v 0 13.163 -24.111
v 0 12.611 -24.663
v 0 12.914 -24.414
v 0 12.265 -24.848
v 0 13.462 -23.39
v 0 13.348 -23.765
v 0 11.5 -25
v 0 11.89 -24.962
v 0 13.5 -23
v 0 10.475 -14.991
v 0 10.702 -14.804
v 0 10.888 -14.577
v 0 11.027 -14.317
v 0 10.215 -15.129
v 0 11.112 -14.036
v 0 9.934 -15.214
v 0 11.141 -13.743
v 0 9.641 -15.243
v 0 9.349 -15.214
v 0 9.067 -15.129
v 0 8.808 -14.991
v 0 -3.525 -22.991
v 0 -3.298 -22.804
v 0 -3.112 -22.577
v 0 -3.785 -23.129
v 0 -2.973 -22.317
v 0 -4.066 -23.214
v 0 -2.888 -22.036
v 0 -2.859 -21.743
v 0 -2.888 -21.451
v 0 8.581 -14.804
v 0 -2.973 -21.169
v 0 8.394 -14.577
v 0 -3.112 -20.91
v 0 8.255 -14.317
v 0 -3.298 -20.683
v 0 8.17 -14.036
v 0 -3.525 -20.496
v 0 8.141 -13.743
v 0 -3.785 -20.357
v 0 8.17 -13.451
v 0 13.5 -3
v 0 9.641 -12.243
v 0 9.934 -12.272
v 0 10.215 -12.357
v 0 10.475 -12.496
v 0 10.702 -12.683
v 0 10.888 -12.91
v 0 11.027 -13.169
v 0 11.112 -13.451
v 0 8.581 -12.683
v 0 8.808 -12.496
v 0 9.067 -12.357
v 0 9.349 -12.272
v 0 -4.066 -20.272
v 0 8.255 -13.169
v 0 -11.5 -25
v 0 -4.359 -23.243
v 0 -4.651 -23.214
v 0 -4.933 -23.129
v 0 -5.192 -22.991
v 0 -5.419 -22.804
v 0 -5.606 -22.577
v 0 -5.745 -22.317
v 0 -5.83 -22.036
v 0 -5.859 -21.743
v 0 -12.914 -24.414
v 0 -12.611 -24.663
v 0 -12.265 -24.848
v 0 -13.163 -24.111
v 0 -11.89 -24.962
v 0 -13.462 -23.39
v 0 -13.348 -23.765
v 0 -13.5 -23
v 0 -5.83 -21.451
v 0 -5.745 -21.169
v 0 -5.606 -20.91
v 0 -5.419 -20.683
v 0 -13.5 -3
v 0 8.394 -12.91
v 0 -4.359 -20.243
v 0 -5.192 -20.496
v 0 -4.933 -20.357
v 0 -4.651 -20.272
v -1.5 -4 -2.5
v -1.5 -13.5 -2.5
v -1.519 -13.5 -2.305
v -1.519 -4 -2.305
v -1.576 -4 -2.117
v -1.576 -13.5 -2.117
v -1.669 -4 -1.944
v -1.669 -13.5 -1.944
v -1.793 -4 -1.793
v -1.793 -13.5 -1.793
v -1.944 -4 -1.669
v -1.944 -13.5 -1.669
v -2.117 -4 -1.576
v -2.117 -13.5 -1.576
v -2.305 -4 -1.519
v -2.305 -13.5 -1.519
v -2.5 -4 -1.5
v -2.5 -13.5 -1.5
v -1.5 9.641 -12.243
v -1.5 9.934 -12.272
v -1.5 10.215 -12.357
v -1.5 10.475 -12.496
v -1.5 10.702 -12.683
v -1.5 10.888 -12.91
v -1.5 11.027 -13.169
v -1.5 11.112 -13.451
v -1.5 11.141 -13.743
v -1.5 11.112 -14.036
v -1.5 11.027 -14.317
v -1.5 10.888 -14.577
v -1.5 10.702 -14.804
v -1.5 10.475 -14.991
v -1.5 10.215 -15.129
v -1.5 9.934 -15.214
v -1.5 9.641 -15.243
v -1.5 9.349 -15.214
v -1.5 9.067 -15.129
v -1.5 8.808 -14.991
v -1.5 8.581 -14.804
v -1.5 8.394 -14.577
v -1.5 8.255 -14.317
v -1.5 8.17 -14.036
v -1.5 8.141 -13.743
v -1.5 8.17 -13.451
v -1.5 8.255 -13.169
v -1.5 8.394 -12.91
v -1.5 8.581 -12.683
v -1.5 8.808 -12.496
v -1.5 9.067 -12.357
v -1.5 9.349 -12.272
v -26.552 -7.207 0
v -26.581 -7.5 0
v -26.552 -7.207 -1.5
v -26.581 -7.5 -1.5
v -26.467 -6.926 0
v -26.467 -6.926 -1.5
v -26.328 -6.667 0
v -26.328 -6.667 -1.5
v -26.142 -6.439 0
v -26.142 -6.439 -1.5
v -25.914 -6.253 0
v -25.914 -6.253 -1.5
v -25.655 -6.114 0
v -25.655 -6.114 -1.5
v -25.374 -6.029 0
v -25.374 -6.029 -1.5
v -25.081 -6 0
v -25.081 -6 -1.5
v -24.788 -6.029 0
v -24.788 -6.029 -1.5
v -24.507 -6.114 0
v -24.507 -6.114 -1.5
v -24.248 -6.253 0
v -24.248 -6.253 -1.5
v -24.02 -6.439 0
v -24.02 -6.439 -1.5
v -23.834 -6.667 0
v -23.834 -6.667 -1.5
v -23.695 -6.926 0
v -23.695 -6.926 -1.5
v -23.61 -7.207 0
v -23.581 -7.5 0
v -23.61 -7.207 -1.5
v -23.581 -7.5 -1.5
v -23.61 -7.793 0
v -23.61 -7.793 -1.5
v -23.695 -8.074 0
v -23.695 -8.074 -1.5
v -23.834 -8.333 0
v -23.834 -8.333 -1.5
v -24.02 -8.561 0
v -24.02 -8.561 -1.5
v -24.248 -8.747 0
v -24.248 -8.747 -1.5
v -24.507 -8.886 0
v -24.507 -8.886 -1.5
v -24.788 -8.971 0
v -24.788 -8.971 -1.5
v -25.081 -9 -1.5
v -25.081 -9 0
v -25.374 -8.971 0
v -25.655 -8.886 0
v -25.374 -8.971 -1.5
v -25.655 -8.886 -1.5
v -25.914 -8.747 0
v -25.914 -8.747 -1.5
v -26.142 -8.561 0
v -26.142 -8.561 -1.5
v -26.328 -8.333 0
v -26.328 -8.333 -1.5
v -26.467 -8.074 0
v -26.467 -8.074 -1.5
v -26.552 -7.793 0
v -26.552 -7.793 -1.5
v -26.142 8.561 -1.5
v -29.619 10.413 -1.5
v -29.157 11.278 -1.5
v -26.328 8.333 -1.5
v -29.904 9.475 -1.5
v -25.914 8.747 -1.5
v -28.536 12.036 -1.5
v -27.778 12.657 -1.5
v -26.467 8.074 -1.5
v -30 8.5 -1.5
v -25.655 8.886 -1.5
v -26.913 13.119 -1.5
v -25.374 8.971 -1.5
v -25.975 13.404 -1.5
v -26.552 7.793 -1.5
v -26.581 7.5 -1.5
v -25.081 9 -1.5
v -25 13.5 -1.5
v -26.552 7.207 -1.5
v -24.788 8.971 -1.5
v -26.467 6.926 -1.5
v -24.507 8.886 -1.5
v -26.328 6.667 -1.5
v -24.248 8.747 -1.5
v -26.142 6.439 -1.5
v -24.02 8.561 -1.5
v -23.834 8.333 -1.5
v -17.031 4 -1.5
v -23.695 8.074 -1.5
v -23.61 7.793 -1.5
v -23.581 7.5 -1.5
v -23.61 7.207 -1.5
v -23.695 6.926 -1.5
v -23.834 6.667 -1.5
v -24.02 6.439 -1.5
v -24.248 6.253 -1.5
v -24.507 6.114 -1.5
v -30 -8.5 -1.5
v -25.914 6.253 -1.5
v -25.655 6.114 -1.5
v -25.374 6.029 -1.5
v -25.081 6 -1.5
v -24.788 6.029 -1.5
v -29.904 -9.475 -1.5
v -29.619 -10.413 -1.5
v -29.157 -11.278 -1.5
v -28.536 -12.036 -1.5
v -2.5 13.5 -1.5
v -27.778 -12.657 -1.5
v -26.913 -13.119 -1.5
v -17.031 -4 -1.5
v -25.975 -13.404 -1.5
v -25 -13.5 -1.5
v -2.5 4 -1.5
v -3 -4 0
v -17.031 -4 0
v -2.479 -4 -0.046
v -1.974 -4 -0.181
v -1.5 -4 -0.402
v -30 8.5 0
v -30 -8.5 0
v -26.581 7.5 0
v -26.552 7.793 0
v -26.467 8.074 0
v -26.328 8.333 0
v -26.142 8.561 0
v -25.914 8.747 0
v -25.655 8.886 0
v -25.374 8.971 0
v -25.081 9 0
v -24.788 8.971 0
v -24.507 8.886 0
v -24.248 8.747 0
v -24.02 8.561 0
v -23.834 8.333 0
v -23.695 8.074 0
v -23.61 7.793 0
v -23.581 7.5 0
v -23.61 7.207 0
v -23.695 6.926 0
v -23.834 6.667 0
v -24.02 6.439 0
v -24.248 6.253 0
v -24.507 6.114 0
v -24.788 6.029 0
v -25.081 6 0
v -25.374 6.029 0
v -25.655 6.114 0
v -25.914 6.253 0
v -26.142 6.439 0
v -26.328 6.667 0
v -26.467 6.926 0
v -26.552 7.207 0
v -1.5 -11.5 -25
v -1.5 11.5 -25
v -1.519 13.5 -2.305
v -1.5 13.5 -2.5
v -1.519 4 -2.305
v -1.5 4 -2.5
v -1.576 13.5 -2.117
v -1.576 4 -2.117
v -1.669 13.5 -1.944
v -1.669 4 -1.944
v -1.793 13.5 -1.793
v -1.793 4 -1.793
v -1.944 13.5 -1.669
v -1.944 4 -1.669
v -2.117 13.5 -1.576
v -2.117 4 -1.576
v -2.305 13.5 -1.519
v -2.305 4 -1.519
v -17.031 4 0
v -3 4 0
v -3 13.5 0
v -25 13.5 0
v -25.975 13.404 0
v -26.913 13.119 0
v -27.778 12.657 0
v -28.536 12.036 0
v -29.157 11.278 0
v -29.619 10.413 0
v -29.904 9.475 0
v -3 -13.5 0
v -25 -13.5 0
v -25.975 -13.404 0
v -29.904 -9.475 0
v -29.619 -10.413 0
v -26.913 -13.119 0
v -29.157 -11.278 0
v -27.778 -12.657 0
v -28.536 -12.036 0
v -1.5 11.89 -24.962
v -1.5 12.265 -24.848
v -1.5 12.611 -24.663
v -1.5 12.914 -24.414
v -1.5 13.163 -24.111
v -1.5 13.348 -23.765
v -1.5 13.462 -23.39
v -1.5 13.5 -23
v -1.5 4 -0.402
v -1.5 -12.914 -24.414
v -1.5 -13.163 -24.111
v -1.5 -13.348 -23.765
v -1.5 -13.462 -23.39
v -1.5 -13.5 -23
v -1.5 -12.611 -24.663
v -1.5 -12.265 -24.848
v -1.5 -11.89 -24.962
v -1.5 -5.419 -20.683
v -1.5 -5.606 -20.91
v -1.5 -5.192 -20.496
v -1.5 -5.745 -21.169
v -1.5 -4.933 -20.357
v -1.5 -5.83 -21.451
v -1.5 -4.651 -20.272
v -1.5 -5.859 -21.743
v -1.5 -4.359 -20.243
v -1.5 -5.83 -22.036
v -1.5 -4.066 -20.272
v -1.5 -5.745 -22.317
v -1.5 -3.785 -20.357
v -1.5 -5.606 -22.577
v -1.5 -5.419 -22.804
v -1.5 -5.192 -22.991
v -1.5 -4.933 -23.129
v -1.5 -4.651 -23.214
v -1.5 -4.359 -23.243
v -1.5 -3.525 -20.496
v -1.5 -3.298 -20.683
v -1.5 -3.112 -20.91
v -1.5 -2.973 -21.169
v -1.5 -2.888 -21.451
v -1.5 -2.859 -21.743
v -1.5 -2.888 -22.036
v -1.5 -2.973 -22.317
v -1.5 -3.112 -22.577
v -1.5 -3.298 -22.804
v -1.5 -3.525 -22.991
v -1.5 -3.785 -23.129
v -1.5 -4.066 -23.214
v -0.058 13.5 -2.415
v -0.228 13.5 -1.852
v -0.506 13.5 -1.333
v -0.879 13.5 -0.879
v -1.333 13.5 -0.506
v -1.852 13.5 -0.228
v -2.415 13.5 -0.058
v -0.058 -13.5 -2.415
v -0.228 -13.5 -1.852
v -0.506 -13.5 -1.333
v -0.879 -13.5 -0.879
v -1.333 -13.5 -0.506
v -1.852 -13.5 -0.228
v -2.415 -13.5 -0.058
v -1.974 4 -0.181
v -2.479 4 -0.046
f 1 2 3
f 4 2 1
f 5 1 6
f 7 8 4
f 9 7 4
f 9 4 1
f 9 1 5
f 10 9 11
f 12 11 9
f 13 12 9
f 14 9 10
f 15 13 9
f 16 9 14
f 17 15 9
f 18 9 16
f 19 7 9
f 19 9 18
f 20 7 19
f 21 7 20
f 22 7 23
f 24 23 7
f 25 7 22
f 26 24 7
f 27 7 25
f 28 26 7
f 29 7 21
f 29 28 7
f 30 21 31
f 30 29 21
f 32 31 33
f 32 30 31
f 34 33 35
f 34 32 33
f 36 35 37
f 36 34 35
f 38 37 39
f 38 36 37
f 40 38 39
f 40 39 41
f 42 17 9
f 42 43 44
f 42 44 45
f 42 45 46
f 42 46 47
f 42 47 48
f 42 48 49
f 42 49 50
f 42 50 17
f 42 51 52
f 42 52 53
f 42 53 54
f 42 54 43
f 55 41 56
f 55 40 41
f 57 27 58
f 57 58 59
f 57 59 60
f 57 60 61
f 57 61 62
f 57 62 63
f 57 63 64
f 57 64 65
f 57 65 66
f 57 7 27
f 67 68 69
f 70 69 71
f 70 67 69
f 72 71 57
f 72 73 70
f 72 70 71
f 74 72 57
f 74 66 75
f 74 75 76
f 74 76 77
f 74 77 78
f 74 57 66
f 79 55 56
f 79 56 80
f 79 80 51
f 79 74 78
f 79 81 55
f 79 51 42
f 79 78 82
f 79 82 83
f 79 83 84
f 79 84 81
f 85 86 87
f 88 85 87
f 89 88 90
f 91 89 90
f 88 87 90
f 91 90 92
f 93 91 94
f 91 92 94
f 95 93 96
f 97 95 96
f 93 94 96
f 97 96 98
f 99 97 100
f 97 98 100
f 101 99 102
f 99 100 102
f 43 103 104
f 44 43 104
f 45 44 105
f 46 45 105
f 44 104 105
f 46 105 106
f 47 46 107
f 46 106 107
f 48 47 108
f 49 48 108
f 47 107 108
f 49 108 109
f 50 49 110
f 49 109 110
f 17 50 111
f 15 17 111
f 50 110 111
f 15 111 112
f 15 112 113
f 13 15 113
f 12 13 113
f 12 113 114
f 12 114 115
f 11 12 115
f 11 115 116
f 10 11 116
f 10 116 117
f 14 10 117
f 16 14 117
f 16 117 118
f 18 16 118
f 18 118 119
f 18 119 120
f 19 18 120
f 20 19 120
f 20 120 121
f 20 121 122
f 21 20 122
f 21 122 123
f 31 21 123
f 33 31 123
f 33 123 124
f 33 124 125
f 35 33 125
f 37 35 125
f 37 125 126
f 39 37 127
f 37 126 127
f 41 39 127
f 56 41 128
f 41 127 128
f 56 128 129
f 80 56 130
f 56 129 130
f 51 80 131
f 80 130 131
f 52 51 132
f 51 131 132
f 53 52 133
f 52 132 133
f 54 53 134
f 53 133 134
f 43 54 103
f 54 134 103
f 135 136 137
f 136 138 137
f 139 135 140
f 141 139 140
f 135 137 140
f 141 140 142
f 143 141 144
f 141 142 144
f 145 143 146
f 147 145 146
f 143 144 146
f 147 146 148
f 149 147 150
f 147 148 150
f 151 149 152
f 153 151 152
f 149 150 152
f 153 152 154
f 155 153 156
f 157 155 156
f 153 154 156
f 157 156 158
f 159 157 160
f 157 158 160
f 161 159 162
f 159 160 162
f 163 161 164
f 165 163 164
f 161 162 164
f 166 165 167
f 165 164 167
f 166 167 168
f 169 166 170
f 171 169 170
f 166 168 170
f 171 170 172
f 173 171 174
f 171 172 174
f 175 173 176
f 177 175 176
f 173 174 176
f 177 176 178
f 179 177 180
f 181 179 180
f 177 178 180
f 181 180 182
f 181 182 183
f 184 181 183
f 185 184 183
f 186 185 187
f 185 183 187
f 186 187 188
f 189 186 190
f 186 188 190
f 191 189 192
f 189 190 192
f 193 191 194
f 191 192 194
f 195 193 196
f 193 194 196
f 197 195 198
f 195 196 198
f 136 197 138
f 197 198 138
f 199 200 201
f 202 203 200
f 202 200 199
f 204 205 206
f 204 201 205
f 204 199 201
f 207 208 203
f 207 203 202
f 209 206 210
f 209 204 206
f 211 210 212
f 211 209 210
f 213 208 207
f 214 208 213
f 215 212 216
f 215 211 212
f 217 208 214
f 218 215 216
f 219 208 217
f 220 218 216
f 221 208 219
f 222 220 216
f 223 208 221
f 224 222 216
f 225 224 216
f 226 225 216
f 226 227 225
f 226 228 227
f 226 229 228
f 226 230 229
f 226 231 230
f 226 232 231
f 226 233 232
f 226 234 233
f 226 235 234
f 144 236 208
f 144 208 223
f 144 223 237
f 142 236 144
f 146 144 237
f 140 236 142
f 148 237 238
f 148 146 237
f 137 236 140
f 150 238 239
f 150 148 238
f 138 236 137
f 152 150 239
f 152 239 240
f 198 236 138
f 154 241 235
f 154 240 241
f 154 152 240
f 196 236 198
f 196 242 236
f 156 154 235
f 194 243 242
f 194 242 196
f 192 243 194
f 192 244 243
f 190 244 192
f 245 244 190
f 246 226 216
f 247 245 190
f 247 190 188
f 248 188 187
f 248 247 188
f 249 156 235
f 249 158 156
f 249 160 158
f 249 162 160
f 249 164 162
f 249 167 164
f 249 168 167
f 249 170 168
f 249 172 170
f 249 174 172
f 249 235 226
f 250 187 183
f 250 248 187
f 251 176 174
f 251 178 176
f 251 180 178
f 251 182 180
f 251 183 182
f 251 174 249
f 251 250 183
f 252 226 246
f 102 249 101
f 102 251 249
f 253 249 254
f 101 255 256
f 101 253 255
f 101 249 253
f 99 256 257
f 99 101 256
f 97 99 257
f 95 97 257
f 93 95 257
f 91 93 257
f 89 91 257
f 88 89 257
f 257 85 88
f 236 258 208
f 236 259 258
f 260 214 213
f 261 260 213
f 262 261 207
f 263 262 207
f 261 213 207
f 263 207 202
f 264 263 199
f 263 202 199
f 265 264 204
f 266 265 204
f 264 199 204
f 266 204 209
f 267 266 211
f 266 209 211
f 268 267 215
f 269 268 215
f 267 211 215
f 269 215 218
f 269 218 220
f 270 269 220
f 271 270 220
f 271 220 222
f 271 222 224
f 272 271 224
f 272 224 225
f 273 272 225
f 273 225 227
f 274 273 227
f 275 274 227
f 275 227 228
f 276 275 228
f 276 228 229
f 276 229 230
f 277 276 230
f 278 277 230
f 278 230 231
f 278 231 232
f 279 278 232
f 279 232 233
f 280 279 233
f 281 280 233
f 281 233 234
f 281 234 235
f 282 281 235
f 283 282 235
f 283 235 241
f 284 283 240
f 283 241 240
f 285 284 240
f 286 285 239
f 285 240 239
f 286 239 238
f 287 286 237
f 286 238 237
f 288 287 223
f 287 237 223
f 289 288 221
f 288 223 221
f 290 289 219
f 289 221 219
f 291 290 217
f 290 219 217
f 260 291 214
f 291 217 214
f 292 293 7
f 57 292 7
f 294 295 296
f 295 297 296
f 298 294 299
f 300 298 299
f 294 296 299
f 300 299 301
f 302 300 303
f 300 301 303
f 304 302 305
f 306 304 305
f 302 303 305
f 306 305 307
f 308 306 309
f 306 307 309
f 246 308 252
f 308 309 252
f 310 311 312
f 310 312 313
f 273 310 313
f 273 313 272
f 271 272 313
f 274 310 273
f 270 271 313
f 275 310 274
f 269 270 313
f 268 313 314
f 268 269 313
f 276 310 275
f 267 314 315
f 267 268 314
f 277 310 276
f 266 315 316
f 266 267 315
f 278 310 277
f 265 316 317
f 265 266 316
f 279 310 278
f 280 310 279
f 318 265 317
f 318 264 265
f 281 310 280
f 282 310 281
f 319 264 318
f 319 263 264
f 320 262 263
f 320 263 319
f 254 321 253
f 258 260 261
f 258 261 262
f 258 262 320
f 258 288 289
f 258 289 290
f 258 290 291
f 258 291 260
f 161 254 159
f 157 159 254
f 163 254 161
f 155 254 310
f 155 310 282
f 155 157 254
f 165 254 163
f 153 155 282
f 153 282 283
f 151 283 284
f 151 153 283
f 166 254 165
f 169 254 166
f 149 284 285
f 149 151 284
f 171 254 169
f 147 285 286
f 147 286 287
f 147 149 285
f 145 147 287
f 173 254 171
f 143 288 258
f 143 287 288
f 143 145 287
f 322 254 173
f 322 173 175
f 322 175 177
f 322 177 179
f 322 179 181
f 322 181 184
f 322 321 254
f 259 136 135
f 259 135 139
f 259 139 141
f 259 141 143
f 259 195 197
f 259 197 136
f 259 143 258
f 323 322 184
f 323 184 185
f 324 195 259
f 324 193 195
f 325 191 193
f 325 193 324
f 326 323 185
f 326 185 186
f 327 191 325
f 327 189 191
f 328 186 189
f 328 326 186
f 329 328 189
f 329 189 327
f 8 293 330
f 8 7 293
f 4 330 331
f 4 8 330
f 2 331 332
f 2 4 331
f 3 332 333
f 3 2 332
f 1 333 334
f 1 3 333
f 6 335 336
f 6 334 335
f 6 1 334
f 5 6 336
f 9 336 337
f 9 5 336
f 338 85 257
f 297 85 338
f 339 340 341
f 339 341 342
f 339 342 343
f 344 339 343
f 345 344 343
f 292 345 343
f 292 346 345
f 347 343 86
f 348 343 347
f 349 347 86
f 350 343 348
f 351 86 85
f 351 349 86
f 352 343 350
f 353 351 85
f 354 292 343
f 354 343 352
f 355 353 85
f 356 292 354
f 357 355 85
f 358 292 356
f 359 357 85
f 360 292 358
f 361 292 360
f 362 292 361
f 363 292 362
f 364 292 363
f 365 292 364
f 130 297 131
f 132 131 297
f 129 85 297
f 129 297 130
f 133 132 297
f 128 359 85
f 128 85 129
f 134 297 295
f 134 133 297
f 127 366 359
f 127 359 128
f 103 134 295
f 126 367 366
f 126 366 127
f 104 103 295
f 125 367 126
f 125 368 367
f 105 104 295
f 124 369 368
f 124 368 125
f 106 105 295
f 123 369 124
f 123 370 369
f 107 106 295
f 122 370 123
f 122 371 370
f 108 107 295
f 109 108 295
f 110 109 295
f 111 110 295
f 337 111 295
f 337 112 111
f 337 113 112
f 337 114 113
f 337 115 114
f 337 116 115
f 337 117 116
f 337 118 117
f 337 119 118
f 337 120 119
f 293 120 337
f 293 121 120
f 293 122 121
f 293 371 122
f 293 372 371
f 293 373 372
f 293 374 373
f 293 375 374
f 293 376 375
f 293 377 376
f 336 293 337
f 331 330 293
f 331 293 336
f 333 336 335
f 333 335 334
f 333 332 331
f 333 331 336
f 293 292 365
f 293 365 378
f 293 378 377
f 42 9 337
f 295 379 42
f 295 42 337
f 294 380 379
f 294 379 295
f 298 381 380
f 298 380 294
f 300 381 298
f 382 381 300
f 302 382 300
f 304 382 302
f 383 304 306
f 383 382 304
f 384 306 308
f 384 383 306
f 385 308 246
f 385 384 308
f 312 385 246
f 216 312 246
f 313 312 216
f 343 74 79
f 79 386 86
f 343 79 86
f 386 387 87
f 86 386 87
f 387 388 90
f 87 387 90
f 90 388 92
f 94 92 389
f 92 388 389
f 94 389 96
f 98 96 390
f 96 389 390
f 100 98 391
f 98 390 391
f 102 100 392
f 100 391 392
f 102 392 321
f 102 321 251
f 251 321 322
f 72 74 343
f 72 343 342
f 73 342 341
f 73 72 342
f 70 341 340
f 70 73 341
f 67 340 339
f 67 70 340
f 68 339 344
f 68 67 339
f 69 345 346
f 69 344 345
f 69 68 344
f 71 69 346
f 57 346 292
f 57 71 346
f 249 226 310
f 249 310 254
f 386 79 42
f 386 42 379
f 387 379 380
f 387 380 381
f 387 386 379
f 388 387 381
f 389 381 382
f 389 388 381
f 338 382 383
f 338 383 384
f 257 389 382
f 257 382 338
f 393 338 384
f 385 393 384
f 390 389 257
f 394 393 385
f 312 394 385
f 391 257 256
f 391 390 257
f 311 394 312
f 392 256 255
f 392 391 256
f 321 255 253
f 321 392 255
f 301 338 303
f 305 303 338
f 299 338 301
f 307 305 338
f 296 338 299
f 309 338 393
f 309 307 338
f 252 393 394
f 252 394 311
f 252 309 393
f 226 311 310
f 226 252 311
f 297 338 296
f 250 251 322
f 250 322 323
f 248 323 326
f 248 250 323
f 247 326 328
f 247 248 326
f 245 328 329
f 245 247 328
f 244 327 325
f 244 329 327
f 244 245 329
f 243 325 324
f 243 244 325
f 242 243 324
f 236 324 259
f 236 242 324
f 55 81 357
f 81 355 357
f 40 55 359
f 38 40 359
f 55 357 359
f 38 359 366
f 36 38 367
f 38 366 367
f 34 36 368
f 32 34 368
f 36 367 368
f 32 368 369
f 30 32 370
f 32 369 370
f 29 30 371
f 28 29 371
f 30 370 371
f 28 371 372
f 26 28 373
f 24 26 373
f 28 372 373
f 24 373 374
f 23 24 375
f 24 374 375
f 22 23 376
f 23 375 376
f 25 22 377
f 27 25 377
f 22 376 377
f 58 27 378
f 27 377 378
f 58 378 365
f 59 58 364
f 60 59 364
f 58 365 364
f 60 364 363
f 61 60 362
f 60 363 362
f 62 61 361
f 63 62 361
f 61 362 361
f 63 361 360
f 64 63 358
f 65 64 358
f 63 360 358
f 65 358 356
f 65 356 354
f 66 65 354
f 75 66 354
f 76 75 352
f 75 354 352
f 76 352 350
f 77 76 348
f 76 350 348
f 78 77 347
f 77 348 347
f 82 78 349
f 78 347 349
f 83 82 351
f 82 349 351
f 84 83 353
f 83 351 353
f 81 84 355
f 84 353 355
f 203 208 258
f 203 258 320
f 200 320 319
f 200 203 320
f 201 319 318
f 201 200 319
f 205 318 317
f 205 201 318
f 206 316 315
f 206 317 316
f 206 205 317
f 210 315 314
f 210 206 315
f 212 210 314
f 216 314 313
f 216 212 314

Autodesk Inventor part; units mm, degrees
ref_plane "YZ Plane" through (0, 0, 0) normal (1, 0, 0) x (0, 1, 0)
ref_plane "XZ Plane" through (0, 0, 0) normal (0, 1, 0) x (-1, 0, 0)
ref_plane "XY Plane" through (0, 0, 0) normal (0, 0, 1) x (1, 0, 0)
sketch "Эскиз1" plane through (0, 0, 0) normal (0, 1, 0) x (-1, 0, 0)
  line L0 (0, 0) -> (30, 0)
  line L1 (30, 0) -> (30, -1.5)
  line L2 (30, -1.5) -> (0, -1.5)
  line L3 (0, -1.5) -> (0, 0)
  line L4 (0, -1.5) -> (1.5, -1.5)
  line L5 (1.5, -1.5) -> (1.5, -25)
  line L6 (1.5, -25) -> (0, -25)
  line L7 (0, -25) -> (0, -1.5)
  dimension "d0" = 1.5
  dimension "d1" = 25
  dimension "d2" = 30
  dimension "d3" = 1.5
extrude "Выдавливание1" add sketch "Эскиз1" along normal mid plane 27
sketch "Эскиз2" plane through (-1.5, -13.5, -1.5) normal (0, 0, -1) x (-1, 0, 0)
  line L0 (28.5, 27) -> (-1.5, 27) construction
  line L1 (23.581, 27) -> (23.581, 0.3508) construction
  line L2 (28.5, 0) -> (28.5, 27) construction
  line L3 (28.5, 13.5) -> (-1.5, 13.5) construction
  circle A0 centre (23.581, 21) radius 1.5
  circle A1 centre (23.581, 6) radius 1.5
  line L4 (0, 0) -> (0, 27) projected
  line L5 (0, 17.5) -> (15.5309, 17.5)
  line L6 (15.5309, 17.5) -> (15.5309, 9.5)
  line L7 (15.5309, 9.5) -> (0, 9.5)
  line L8 (0, 9.5) -> (0, 17.5)
  line L9 (28.5, 0) -> (0, 0) projected
  dimension "d6" = 3
  dimension "d7" = 3
  dimension "d8" = 15
  dimension "d9" = 7.5
  dimension "d10" = 9.5
  dimension "d11" = 15.5309
  dimension "d12" = 9.5
extrude "Выдавливание2" cut sketch "Эскиз2" against normal blind 27 contours L4 L5 L6 L7
fillet "Сопряжение1" radius 1 2 edges at (-1.5, 8.75, -1.5) (-1.5, -8.75, -1.5)
fillet "Сопряжение2" radius 3 1 edges at (0, 0, 0)
extrude "Выдавливание3" cut sketch "Эскиз2" against normal blind 27 contours A0 | A1
sketch "Эскиз3" plane through (-1.5, -13.5, -25) normal (-1, 0, 0) x (0, 0, 1)
  circle A0 centre (3.2567, 9.1412) radius 1.5
  circle A1 centre (11.2567, 23.1412) radius 1.5
  point P0 (25, 13.5)
  dimension "d19" = 3
  dimension "d20" = 3
  dimension "d23" = 14
  dimension "d24" = 8
extrude "Выдавливание4" cut sketch "Эскиз3" against normal blind 27
fillet "Сопряжение3" radius 5 2 edges at (-30, -13.5, -0.75) (-30, 13.5, -0.75)
fillet "Сопряжение4" radius 2 2 edges at (-0.75, -13.5, -25) (-0.75, 13.5, -25)
properties part number "крепление концевика"
